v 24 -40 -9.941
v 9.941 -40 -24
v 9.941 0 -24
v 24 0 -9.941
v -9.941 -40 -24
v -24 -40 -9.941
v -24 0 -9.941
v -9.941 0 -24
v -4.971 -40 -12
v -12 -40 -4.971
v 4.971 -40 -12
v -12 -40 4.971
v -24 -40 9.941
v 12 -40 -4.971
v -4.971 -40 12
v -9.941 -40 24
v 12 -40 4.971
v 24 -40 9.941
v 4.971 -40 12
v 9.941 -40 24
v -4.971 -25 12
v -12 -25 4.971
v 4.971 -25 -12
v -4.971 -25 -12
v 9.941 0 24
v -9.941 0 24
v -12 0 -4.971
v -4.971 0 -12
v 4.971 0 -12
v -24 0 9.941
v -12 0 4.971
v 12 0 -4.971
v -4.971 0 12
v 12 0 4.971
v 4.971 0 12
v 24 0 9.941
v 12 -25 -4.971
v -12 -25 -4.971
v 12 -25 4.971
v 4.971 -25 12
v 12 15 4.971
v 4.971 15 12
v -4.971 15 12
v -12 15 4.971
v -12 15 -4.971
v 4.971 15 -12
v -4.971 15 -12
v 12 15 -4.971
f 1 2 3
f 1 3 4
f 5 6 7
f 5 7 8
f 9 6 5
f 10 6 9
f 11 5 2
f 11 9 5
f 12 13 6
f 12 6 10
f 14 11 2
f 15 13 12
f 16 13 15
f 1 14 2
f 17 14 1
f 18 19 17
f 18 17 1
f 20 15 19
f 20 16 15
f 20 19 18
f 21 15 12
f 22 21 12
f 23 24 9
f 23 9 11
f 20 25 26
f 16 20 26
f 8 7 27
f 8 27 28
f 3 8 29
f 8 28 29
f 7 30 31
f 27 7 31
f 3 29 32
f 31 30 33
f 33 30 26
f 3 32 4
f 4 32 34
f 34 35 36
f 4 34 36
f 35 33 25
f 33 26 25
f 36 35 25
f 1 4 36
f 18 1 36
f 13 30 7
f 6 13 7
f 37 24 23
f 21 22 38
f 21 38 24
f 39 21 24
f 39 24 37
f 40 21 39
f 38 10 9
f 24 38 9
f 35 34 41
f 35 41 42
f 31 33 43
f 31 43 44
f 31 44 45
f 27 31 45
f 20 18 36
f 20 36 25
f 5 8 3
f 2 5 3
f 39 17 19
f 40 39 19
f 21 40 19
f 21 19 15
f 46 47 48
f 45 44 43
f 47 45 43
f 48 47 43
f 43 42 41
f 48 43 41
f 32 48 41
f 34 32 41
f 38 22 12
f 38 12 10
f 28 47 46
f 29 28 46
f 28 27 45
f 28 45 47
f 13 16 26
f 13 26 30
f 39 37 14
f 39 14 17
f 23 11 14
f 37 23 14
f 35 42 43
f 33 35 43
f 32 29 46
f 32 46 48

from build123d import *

# Parameters (mm, degrees)
F1_DEPTH = 40
F3_DEPTH = 15
F5_DEPTH = 15


with BuildPart() as f1:
    # F0 (on Front) → F1 (new body)
    with BuildSketch(Plane.XZ):
        Polygon((24, -9.941125497), (24, 9.941125497), (9.941125497, 24), (-9.941125497, 24), (-24, 9.941125497), (-24, -9.941125497), (-9.941125497, -24), (9.941125497, -24), align=None)
    extrude(amount=F1_DEPTH)

    # F2 (on Front) → F3 (join)
    with BuildSketch(Plane.XZ):
        Polygon((4.9705627485, -12), (12, -4.9705627485), (12, 4.9705627485), (4.9705627485, 12), (-4.9705627485, 12), (-12, 4.9705627485), (-12, -4.9705627485), (-4.9705627485, -12), align=None)
    extrude(amount=-F3_DEPTH)

    # F4 (on face) → F5 (cut)
    with BuildSketch(Plane.XZ.offset(40)):
        Polygon((-4.9705627485, -12), (4.9705627485, -12), (12, -4.9705627485), (12, 4.9705627485), (4.9705627485, 12), (-4.9705627485, 12), (-12, 4.9705627485), (-12, -4.9705627485), align=None)
    extrude(amount=-F5_DEPTH, mode=Mode.SUBTRACT)


solid = f1.part
